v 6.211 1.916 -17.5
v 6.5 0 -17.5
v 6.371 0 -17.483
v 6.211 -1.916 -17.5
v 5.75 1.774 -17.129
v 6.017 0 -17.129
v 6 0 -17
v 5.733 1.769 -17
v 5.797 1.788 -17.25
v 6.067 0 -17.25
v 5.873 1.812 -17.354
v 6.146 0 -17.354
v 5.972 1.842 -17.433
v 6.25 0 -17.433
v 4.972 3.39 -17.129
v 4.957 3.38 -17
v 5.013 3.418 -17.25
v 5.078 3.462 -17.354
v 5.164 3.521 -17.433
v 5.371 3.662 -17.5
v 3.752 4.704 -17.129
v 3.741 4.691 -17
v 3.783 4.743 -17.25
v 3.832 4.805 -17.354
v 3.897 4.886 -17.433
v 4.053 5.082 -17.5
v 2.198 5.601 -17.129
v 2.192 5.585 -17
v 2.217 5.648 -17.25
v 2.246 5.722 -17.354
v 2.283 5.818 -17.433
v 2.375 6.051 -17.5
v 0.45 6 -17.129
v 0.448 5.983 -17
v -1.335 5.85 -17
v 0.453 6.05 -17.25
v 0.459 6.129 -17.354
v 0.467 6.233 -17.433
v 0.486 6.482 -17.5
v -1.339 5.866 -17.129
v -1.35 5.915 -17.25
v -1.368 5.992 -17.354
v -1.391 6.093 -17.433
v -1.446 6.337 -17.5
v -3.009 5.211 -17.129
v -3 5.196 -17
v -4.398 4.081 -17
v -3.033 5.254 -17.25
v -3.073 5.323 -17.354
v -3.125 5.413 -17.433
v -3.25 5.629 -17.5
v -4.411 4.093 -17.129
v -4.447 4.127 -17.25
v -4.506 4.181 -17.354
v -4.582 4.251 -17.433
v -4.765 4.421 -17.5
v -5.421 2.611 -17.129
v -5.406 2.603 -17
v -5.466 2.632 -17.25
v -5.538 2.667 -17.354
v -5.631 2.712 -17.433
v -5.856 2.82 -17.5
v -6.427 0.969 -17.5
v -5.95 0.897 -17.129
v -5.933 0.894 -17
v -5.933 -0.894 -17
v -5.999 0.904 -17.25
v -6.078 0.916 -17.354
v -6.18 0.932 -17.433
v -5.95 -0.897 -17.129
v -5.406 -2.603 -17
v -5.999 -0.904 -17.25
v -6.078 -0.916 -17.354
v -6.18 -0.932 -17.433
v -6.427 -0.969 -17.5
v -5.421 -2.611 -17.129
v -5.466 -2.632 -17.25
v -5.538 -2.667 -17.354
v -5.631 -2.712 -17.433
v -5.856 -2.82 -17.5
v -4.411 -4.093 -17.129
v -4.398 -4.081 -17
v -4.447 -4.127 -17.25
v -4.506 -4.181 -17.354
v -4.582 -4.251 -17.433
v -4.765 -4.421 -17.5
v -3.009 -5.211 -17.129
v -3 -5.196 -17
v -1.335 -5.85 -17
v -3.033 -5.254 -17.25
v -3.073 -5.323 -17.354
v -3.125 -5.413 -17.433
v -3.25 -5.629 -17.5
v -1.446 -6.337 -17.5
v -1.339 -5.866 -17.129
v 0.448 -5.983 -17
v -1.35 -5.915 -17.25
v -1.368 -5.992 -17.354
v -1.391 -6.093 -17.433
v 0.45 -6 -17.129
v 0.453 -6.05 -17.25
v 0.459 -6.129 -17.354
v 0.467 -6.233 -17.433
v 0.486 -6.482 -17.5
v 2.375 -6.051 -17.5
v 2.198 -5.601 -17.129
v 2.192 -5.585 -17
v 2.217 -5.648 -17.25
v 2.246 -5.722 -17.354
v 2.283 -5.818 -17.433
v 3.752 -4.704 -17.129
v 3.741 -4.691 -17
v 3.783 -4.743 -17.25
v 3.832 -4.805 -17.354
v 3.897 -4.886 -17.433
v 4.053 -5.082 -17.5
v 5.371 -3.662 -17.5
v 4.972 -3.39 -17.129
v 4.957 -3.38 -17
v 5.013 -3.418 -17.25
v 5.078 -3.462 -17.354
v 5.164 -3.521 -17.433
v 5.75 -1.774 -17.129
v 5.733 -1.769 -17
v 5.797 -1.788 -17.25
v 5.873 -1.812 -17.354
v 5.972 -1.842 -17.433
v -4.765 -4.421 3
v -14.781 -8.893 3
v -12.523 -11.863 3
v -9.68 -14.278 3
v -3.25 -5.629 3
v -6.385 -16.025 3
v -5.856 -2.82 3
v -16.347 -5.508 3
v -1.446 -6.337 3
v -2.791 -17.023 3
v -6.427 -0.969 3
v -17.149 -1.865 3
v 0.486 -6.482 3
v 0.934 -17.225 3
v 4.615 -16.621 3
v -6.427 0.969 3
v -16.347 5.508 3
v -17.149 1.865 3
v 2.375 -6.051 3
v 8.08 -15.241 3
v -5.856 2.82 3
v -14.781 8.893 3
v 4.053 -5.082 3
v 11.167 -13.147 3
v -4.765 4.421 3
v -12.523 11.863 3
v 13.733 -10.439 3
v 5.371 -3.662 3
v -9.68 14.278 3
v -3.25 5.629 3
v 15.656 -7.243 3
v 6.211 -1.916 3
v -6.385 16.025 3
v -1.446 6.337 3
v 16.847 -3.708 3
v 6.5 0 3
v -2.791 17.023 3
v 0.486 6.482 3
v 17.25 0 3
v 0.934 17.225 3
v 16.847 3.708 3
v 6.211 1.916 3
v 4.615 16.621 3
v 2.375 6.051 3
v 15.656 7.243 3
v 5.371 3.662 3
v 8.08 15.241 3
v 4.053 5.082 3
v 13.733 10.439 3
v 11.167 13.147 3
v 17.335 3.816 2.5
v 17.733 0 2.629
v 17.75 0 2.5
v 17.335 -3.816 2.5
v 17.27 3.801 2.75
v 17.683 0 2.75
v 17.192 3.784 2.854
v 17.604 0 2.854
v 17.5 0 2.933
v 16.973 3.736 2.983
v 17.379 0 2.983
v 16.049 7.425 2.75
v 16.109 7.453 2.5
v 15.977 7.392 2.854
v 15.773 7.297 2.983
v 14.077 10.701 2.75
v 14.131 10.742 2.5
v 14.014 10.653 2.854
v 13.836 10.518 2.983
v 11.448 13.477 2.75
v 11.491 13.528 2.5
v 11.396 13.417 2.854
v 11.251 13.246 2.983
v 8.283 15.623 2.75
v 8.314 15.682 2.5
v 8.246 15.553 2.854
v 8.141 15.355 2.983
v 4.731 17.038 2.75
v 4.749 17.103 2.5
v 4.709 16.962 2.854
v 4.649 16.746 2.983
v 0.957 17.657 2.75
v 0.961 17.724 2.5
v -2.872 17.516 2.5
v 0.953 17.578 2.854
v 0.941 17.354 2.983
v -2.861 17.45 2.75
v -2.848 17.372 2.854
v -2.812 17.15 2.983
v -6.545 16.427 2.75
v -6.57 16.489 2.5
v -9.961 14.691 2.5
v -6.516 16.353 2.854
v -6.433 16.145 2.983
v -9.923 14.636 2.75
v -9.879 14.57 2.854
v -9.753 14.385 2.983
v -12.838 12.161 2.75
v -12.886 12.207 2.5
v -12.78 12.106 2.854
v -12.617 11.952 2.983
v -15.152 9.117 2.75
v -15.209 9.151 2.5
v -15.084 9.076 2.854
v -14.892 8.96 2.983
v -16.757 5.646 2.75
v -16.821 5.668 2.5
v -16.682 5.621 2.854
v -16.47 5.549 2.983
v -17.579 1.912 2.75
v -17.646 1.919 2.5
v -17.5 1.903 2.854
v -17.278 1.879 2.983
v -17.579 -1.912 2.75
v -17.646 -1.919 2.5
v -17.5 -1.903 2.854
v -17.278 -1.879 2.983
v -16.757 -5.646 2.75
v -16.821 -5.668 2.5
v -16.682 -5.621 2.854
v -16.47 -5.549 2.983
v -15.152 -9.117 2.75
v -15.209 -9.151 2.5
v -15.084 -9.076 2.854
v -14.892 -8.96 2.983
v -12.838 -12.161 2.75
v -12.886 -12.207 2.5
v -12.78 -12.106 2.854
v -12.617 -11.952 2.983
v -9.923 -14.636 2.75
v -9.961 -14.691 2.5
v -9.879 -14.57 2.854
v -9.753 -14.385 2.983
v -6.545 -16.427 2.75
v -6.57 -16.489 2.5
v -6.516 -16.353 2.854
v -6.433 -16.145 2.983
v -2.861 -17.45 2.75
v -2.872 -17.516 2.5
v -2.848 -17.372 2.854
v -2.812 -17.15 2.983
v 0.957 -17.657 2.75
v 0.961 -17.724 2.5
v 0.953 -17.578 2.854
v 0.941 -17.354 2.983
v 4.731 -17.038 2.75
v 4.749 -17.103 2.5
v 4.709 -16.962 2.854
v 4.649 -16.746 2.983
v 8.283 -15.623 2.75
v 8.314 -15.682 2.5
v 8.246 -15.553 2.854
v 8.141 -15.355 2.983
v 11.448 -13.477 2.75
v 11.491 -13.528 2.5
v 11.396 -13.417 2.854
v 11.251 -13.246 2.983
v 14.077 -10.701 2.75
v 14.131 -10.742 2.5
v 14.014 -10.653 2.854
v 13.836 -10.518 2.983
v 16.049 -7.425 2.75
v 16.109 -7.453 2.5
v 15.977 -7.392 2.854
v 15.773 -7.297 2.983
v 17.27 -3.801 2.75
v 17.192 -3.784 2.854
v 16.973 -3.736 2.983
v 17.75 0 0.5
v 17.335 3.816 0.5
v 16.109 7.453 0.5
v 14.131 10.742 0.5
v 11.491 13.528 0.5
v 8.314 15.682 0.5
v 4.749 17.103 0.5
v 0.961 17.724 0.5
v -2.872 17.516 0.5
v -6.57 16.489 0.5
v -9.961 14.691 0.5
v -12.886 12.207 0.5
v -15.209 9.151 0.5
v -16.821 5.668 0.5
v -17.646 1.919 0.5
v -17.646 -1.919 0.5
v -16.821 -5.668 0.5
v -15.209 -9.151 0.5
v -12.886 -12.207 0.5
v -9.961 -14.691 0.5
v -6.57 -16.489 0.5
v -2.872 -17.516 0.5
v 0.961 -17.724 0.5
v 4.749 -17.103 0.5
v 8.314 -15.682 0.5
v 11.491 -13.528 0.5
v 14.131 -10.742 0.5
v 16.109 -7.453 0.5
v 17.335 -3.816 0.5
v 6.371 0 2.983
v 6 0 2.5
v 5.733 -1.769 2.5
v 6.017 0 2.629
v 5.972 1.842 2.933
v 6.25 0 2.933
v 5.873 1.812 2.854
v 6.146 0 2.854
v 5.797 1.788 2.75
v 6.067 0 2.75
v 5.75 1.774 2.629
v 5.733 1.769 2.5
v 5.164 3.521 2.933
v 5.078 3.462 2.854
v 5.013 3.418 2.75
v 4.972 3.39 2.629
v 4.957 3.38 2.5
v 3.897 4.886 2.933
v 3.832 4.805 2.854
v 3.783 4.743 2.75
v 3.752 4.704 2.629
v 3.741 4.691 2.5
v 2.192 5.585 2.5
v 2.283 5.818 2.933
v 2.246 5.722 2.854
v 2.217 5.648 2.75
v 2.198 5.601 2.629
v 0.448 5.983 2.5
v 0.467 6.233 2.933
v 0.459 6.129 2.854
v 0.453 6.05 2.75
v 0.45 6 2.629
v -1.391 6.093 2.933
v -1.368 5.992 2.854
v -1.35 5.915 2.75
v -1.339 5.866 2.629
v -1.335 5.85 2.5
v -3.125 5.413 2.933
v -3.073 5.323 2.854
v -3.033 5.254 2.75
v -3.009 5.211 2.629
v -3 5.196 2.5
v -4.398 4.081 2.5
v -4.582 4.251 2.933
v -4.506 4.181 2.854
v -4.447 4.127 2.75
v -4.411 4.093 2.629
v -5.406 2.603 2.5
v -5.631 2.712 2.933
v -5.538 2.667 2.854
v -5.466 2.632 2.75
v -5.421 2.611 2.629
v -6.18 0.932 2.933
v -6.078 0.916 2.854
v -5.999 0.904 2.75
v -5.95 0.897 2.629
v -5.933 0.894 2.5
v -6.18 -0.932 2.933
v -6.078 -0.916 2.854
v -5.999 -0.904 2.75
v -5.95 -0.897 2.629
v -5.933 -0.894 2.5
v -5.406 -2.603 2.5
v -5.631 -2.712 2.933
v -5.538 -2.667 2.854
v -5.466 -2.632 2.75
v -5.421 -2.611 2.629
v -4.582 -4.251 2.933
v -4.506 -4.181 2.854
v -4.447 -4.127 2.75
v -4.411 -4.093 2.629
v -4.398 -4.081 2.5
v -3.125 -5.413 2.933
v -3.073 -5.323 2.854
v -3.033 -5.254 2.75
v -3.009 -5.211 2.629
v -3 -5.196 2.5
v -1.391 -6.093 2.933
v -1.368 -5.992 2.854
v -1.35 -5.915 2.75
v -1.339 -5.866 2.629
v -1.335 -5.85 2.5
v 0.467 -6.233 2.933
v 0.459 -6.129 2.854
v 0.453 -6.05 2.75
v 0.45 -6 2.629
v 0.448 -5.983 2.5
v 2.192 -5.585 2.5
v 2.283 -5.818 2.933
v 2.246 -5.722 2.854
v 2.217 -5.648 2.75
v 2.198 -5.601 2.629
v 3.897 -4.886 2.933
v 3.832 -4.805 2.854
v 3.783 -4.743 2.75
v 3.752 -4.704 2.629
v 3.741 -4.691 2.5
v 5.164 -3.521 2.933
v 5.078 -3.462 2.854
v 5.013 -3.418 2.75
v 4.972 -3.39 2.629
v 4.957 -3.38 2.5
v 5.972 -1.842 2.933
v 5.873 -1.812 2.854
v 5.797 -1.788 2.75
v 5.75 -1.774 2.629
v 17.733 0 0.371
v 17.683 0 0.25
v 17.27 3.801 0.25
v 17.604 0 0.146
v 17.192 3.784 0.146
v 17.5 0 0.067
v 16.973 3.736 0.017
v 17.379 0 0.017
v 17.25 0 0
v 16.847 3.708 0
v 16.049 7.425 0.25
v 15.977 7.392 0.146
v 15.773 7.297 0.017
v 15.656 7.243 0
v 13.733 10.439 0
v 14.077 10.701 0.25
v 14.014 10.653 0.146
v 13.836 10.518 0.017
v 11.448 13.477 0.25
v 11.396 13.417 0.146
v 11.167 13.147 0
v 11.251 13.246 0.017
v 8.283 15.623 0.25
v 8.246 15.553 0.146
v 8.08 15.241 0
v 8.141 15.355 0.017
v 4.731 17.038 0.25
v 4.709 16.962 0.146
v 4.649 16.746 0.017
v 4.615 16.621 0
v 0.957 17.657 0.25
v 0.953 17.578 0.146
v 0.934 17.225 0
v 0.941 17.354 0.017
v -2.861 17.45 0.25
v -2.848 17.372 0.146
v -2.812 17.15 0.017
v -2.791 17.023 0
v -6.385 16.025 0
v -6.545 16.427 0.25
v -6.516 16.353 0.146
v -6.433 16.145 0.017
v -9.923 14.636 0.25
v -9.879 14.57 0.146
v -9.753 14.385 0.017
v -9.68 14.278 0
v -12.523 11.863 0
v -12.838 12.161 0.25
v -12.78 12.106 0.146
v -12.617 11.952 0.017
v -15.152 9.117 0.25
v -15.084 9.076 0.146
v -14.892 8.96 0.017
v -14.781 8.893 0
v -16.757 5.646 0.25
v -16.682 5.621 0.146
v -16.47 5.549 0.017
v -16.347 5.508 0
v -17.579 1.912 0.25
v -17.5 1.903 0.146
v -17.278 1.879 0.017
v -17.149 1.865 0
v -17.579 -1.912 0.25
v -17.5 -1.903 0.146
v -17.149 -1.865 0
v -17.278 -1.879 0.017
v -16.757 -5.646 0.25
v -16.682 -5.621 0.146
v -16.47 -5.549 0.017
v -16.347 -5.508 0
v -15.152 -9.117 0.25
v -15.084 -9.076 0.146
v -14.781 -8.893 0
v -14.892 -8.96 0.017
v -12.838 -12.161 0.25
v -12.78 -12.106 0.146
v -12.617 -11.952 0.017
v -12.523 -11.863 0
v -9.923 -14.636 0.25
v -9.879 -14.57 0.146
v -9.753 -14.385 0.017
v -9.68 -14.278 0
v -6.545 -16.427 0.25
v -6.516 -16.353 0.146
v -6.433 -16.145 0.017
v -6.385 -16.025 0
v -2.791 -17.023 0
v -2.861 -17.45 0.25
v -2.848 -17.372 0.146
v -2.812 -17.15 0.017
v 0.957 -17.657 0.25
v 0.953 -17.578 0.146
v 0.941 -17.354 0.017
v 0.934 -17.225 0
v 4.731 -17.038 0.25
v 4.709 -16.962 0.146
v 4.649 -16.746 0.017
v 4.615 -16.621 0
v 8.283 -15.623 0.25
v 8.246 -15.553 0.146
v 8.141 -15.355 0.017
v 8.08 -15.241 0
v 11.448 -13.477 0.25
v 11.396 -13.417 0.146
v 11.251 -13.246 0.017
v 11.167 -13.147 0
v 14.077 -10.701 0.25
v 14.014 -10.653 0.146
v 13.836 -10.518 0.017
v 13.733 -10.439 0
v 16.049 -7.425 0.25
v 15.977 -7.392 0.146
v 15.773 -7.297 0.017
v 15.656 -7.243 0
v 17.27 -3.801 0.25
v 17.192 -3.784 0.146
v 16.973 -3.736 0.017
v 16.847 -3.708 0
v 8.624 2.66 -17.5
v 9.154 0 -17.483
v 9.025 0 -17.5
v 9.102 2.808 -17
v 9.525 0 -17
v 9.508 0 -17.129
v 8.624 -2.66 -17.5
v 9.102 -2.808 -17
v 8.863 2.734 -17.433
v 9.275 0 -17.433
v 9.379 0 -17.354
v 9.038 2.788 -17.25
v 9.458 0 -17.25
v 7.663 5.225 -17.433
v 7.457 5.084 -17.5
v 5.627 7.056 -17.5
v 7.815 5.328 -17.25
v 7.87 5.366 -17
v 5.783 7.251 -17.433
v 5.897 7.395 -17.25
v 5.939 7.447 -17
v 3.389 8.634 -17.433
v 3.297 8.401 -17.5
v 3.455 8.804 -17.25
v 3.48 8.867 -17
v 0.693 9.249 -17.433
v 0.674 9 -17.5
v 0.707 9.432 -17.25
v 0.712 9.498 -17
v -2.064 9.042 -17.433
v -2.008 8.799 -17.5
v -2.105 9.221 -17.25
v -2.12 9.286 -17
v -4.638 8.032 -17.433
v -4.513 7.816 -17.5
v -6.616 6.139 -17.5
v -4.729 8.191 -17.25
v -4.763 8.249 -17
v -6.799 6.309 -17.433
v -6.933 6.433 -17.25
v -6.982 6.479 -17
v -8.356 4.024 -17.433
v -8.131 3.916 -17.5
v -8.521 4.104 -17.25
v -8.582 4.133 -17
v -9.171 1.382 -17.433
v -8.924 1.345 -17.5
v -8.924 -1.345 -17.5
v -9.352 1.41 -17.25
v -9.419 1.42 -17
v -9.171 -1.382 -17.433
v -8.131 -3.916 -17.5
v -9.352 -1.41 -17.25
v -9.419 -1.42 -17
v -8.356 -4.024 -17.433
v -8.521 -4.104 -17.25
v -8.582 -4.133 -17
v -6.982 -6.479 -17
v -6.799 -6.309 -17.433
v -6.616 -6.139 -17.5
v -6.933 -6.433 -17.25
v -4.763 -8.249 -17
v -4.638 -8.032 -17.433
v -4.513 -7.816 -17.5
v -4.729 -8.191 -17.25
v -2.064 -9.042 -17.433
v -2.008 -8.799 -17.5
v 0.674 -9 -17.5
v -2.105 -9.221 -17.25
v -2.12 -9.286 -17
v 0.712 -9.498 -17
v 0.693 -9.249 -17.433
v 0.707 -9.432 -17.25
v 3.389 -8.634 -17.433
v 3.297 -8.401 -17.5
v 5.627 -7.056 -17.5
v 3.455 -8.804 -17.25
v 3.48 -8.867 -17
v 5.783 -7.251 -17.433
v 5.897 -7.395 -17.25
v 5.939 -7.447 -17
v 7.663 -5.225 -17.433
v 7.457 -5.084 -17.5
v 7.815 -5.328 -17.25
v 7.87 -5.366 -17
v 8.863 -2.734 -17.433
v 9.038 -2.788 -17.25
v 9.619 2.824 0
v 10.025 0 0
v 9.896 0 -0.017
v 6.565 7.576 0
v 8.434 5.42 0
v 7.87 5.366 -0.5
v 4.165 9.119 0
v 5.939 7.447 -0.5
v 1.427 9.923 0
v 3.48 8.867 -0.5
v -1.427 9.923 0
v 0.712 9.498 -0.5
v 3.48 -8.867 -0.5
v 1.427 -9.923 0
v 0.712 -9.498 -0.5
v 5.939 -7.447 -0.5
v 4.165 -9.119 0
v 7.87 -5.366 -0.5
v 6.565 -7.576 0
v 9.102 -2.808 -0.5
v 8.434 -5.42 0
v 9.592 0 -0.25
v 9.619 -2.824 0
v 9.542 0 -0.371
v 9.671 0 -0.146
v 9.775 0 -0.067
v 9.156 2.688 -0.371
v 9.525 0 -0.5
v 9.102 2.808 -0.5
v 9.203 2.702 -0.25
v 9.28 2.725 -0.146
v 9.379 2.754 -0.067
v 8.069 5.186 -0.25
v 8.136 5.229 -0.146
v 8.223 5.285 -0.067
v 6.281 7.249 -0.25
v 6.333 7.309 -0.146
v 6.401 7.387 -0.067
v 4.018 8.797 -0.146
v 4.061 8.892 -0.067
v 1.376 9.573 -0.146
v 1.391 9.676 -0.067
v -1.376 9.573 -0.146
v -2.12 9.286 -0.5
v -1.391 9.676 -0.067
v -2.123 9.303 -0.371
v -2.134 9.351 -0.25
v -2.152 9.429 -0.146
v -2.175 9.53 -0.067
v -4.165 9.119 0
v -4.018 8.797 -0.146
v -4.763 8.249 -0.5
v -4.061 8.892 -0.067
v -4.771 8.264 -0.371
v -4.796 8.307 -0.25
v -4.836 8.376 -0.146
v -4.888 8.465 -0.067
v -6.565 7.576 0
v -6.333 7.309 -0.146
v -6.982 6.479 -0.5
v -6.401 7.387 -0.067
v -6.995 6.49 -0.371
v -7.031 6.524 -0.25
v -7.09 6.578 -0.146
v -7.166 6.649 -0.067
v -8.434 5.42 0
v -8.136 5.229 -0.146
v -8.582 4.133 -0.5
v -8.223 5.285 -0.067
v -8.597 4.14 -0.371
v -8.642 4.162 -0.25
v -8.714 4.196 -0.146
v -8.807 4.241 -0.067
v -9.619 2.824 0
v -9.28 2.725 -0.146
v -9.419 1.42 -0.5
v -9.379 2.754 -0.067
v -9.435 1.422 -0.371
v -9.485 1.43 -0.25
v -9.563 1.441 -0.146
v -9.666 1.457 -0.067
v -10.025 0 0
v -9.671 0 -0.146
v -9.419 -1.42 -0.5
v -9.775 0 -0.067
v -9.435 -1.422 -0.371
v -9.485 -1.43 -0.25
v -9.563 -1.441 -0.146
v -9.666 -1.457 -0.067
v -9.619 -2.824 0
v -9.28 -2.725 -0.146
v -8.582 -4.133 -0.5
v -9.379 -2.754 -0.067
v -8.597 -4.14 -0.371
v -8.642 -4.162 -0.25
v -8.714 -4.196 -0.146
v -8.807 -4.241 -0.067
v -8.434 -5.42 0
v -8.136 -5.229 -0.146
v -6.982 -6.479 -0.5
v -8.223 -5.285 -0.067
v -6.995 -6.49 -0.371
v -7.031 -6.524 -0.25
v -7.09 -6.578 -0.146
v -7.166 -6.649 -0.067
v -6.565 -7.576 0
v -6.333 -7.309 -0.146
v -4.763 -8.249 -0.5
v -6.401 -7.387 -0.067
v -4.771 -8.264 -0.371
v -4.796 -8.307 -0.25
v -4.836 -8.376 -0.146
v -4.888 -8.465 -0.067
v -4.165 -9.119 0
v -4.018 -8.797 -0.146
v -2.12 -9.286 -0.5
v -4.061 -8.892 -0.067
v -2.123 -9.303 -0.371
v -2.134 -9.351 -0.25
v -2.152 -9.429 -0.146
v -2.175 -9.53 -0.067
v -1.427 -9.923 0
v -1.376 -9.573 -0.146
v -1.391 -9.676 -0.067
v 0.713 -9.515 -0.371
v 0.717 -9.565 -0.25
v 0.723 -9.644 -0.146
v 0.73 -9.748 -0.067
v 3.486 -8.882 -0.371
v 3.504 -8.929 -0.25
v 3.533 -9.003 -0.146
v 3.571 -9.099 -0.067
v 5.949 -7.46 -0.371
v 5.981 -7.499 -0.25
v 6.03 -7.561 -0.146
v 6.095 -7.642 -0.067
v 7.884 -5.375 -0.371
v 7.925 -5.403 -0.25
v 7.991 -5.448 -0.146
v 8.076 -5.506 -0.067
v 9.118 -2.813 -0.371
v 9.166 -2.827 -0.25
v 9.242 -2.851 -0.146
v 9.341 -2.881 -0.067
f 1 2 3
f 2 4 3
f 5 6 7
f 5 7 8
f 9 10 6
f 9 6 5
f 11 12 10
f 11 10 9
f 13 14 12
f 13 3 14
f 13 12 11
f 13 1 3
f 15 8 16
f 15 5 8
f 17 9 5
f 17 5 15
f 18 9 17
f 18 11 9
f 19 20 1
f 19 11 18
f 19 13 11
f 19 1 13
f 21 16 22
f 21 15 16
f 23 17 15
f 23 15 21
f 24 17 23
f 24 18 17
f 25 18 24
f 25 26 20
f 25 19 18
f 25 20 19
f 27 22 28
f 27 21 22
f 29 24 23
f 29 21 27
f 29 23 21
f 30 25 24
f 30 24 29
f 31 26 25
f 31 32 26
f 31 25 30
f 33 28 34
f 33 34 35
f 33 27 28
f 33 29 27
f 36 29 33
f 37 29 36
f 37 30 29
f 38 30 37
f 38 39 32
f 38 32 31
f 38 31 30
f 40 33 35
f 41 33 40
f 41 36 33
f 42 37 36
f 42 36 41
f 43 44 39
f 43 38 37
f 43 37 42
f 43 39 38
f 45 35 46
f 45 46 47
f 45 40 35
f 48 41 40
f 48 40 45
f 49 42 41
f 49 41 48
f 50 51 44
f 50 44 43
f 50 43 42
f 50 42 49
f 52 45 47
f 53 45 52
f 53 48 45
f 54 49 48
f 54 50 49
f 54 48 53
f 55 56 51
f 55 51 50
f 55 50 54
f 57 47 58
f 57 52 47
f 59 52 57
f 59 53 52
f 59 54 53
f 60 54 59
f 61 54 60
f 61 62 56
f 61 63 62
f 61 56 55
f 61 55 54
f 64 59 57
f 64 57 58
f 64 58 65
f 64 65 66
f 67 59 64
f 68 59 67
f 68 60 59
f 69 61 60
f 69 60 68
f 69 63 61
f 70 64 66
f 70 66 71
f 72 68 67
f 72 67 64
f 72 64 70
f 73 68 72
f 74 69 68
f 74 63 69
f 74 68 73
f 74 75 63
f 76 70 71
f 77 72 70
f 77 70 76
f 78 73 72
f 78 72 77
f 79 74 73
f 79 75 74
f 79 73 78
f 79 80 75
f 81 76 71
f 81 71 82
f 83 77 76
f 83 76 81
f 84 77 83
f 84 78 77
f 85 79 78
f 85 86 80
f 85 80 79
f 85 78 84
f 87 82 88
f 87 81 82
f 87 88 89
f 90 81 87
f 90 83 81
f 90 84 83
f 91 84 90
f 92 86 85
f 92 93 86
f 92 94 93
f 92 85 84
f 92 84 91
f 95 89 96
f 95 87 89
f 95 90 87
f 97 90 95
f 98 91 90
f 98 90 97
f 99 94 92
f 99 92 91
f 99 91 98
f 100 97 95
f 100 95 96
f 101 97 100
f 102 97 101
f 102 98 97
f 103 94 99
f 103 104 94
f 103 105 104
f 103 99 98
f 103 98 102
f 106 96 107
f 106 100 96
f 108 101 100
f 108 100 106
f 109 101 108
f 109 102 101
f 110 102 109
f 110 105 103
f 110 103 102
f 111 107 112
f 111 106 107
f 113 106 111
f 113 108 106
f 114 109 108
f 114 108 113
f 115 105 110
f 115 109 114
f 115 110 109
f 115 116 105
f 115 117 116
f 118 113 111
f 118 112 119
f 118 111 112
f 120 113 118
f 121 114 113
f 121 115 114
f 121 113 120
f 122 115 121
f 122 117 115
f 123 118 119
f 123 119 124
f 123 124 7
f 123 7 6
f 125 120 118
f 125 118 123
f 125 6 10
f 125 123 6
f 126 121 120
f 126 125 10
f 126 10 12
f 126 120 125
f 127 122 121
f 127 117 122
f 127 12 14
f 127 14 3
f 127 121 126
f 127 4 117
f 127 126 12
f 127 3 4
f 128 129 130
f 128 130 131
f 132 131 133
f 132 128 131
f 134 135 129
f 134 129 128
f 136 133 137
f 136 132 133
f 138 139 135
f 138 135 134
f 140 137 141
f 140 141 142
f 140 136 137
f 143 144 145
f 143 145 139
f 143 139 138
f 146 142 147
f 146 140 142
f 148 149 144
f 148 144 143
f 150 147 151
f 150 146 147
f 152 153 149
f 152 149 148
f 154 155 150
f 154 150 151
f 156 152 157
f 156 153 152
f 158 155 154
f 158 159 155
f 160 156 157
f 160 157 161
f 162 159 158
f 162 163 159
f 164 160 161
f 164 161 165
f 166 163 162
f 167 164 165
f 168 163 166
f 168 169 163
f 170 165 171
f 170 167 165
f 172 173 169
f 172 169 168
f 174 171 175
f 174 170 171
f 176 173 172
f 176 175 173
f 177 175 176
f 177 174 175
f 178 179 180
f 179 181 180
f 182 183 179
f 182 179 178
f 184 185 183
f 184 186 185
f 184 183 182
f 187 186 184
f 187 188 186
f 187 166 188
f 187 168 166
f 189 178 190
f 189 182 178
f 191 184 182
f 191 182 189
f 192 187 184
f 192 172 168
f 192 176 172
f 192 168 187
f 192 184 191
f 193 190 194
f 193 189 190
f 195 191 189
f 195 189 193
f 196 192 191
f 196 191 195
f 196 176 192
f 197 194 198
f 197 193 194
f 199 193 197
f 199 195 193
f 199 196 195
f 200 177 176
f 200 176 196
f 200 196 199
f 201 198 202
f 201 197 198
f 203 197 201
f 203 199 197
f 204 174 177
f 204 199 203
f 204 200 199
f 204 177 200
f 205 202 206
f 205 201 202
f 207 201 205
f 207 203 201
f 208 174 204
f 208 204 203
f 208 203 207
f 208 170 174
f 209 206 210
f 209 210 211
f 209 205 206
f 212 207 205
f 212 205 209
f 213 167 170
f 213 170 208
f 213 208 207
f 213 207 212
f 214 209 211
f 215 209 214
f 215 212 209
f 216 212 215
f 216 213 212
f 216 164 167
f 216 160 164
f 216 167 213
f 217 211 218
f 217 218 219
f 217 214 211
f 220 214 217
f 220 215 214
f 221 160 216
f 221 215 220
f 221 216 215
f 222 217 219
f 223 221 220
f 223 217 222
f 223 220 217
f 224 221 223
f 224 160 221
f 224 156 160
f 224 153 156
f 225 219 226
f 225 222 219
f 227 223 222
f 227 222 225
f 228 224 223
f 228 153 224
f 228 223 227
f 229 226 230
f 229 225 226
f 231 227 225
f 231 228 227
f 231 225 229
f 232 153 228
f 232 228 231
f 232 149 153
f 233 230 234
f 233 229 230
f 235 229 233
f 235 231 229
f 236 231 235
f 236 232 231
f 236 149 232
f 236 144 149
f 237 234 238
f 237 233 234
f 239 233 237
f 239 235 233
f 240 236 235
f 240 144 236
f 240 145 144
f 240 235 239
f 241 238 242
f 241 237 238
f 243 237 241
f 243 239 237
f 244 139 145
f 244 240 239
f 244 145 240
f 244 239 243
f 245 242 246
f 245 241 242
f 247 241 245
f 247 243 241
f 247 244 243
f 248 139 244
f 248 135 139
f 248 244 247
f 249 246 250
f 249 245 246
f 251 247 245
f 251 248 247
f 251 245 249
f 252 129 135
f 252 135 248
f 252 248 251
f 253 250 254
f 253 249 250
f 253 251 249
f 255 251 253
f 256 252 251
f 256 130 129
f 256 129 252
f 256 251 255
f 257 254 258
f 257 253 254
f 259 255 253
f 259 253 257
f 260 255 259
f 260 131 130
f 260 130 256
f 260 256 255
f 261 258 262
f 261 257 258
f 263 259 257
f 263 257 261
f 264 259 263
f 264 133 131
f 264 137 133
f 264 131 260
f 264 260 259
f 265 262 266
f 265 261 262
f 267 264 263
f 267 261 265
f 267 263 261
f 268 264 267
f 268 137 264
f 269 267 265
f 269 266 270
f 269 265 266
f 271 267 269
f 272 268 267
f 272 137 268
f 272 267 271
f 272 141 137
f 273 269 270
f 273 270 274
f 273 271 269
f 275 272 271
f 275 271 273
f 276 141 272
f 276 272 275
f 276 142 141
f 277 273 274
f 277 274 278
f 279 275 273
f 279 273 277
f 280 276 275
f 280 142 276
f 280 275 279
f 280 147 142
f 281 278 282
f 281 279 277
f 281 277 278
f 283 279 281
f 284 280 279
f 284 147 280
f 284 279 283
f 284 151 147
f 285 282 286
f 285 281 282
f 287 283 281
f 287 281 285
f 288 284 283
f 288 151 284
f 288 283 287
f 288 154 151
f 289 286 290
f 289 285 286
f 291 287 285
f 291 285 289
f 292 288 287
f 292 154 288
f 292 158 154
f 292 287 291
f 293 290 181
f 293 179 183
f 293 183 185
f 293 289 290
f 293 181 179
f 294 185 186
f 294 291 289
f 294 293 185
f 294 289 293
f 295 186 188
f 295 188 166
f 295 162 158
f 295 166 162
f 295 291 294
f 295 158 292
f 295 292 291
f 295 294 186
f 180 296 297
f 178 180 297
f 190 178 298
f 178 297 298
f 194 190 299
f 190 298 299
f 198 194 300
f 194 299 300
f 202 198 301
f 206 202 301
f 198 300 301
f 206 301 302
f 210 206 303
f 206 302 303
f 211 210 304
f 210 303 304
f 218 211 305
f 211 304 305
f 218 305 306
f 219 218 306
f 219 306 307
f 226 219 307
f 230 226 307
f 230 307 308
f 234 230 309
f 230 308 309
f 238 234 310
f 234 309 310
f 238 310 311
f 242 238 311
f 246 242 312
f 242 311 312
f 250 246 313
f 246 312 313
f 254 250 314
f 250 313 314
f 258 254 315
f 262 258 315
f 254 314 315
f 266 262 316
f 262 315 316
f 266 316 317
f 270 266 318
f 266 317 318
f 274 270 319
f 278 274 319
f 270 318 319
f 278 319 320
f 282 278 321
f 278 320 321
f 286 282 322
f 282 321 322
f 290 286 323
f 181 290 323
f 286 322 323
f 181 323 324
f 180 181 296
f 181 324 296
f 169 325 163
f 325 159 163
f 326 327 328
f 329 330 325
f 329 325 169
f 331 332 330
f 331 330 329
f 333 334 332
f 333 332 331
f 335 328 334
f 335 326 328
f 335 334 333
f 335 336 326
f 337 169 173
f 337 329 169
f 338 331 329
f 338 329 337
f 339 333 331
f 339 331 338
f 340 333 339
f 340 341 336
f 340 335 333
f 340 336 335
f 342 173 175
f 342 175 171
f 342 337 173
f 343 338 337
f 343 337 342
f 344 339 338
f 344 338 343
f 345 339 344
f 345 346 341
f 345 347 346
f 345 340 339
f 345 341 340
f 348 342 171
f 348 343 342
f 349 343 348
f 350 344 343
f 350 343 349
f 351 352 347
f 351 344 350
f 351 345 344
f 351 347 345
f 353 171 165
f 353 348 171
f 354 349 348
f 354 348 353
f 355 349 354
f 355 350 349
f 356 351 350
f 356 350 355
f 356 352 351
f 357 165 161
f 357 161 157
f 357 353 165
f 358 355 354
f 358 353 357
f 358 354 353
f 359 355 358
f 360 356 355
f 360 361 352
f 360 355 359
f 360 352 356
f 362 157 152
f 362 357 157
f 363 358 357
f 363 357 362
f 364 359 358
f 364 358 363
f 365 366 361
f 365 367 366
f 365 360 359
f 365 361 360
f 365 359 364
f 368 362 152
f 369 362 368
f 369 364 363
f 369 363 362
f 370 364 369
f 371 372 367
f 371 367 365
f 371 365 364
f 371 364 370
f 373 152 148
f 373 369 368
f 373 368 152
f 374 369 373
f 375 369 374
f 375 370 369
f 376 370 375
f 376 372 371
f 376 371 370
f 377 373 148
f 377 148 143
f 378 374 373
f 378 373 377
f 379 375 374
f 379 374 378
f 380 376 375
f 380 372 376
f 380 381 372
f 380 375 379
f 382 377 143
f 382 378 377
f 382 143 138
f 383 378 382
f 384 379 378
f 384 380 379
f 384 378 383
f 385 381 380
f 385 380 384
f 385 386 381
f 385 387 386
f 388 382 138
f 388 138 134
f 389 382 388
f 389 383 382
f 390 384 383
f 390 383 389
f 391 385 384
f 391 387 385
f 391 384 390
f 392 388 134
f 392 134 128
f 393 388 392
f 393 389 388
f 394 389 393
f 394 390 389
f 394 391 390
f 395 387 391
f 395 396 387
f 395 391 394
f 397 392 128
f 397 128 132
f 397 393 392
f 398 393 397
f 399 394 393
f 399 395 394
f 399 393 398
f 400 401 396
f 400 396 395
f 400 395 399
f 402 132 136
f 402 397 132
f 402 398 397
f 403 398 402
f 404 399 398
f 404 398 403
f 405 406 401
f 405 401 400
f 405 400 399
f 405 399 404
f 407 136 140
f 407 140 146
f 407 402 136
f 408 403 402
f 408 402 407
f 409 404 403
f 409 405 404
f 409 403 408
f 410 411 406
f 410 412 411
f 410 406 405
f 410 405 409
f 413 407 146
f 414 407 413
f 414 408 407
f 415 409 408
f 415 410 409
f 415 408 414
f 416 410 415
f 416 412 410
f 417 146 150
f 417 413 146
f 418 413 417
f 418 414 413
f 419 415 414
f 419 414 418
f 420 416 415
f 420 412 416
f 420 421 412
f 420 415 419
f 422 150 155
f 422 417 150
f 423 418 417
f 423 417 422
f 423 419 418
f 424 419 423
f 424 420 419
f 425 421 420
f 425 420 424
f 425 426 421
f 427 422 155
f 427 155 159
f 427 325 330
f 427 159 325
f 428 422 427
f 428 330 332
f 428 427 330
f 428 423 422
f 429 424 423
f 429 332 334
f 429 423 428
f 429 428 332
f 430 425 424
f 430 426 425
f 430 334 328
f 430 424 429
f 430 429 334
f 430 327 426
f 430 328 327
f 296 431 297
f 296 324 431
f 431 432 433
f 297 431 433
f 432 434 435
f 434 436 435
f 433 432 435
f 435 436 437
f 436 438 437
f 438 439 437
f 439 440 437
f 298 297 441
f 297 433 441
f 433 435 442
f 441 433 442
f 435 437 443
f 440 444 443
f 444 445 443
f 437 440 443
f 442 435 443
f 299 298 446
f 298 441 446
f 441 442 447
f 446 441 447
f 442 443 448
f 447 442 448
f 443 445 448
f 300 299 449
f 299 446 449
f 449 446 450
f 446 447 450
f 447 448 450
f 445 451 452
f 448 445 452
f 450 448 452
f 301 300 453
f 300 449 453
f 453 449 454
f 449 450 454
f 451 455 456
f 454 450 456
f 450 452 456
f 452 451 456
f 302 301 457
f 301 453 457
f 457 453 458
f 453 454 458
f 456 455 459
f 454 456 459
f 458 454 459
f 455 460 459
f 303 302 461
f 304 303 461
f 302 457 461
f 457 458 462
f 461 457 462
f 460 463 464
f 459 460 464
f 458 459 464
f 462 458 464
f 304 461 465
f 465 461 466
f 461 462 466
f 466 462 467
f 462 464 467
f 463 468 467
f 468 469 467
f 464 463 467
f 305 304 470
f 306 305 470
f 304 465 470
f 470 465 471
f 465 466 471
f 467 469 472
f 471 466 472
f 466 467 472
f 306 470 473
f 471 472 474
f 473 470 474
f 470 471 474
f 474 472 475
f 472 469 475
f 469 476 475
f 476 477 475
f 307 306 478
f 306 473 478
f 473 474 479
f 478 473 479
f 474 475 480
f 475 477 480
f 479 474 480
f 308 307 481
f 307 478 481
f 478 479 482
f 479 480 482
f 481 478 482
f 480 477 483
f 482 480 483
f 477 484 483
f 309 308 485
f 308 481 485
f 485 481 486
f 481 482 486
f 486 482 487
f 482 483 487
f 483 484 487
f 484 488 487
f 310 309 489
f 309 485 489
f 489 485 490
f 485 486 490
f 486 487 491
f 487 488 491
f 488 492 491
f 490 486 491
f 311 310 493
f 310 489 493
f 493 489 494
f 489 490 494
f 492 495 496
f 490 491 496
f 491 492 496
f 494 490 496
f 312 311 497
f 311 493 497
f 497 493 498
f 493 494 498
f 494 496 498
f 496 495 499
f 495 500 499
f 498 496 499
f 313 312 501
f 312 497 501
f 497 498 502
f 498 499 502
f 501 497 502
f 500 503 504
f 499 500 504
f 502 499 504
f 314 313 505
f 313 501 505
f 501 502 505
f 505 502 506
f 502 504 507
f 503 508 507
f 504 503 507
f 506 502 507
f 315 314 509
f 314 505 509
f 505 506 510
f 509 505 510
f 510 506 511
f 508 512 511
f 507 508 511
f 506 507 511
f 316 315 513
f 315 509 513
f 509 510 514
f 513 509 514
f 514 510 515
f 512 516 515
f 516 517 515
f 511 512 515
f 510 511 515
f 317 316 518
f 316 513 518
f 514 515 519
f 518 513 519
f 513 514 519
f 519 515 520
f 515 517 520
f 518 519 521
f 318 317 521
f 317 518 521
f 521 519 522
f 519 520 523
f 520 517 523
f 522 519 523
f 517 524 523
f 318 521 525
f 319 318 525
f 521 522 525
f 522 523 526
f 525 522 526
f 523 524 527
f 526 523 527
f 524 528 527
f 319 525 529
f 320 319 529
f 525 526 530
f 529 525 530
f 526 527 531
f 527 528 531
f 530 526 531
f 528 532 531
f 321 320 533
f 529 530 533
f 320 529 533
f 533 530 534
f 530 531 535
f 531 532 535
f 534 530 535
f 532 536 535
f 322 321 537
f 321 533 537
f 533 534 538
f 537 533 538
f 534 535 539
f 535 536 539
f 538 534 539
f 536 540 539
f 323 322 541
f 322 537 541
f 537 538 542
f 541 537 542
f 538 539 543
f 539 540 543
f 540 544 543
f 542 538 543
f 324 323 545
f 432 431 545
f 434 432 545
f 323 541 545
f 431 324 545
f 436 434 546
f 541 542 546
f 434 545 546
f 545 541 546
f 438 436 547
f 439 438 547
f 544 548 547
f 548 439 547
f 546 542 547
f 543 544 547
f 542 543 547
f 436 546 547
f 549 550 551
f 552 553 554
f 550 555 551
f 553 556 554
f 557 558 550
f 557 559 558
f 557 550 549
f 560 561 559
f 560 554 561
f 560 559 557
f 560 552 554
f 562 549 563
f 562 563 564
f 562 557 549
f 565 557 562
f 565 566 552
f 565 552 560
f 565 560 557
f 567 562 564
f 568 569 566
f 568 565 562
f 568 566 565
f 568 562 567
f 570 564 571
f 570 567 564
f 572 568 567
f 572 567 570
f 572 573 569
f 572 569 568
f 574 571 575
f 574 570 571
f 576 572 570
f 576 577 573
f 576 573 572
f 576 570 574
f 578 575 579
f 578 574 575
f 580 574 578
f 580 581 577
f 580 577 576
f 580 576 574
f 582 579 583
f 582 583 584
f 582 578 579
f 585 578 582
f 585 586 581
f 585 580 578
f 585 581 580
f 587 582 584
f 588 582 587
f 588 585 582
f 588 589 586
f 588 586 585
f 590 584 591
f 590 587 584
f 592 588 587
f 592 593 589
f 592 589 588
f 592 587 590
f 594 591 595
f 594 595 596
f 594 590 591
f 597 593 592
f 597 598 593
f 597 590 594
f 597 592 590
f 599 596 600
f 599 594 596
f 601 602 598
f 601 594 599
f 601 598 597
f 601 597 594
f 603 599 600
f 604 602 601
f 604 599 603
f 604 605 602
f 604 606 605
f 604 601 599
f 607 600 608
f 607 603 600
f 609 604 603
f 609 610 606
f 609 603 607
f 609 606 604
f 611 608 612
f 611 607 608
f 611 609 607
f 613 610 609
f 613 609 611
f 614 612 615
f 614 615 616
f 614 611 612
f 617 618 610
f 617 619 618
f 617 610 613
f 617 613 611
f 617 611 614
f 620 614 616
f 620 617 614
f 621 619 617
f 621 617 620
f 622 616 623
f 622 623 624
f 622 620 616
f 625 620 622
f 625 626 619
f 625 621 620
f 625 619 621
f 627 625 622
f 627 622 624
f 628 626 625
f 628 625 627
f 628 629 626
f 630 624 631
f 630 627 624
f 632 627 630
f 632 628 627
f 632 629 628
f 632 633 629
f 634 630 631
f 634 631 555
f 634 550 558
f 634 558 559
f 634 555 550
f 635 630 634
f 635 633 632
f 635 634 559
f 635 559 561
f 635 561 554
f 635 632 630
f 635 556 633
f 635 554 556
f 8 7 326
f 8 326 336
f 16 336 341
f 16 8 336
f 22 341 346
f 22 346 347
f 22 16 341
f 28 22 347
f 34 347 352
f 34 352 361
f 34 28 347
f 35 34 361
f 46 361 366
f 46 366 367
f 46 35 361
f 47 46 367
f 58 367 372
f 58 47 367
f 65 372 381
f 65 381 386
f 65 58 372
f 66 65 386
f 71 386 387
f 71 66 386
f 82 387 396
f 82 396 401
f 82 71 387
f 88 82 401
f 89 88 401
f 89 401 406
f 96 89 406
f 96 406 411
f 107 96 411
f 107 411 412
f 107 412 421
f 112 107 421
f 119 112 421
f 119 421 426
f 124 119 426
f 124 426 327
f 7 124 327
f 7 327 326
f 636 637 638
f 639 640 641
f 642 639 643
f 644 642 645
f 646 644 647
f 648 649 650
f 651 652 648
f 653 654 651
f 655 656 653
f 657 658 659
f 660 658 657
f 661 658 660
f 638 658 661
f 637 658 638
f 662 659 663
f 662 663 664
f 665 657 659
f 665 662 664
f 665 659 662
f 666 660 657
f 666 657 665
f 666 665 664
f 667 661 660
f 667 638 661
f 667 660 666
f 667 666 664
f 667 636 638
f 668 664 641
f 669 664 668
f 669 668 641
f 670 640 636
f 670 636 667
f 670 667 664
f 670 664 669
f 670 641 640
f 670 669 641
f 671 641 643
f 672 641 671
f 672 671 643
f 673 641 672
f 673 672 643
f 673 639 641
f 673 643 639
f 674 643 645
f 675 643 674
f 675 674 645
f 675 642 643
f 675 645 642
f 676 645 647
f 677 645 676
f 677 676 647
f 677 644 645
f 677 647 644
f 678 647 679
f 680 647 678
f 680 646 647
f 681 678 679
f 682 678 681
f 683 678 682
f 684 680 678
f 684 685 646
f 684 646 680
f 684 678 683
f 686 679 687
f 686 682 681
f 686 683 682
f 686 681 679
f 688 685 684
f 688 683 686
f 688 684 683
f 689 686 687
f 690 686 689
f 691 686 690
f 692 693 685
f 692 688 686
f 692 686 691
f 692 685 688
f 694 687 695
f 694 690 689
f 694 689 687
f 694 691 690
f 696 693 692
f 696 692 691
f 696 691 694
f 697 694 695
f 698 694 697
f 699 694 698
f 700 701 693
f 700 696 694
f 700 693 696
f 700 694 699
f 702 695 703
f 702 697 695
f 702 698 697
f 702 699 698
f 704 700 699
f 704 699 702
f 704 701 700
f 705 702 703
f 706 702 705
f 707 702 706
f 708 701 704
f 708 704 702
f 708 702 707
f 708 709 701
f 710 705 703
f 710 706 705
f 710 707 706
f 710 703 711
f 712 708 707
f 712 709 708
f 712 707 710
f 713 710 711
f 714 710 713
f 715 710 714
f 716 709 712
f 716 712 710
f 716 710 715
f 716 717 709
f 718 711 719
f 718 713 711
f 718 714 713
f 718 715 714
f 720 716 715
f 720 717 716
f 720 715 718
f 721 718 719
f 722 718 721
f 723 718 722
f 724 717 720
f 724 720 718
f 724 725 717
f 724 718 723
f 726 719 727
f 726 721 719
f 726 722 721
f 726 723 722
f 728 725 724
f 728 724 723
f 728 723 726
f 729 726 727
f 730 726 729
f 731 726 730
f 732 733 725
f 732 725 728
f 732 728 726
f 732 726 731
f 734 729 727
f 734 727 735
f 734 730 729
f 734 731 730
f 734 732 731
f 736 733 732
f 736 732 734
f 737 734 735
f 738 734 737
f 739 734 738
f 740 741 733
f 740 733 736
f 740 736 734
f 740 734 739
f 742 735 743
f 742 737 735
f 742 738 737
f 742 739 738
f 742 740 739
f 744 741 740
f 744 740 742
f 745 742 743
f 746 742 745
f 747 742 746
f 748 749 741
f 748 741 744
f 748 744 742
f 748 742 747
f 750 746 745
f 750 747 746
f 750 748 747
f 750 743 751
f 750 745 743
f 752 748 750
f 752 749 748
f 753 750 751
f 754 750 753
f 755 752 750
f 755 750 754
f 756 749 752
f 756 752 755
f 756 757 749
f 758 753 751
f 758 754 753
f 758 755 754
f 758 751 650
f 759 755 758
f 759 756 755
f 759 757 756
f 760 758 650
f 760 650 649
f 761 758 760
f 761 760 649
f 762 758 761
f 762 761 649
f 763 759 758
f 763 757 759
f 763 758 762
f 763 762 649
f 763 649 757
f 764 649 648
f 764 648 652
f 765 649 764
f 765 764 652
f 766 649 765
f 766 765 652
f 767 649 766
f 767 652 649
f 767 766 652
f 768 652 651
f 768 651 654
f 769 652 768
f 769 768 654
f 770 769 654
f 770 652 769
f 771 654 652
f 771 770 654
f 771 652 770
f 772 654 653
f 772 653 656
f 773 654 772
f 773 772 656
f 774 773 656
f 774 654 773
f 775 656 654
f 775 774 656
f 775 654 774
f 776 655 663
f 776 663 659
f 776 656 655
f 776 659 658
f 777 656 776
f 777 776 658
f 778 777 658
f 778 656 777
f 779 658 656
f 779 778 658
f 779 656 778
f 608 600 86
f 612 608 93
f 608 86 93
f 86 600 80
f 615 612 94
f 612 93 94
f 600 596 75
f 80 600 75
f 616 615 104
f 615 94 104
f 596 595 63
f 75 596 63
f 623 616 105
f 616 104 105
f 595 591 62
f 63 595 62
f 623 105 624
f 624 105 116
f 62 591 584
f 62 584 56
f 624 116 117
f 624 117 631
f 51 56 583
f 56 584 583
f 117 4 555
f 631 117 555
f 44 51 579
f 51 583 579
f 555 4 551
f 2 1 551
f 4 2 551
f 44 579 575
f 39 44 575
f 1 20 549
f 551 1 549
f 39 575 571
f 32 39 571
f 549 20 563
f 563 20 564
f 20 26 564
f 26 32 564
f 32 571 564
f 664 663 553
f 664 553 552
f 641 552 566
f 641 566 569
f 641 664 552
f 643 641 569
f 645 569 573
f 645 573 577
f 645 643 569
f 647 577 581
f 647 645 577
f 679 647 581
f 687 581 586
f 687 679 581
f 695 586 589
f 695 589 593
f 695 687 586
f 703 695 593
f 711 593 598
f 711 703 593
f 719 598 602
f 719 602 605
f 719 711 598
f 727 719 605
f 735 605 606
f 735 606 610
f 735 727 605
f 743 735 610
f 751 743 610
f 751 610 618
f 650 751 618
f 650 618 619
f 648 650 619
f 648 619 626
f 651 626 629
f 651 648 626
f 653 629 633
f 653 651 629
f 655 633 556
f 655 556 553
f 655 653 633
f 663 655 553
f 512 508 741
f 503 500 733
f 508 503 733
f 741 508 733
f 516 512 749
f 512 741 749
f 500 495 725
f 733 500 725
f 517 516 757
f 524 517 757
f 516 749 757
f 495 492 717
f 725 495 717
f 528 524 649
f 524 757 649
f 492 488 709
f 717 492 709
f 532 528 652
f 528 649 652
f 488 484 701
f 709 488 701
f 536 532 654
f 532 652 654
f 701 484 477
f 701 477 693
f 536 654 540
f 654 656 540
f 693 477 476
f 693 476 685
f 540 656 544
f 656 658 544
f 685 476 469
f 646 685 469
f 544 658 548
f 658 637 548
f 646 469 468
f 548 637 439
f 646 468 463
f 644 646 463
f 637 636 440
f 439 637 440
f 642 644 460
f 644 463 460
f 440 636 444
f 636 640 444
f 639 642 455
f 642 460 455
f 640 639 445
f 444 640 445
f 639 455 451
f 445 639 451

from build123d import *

# Parameters (mm, degrees)
F0_R     = 9.525
F0_R_2   = 6
F1_DEPTH = 17.5
F2_R     = 17.75
F2_R_2   = 6
F3_DEPTH = 3
F4_R     = 0.5


with BuildPart() as f1:
    # F0 (on Top) → F1 (new body)
    with BuildSketch(Plane.XY):
        Circle(F0_R)
        Circle(F0_R_2, mode=Mode.SUBTRACT)
    extrude(amount=-F1_DEPTH)

    # F2 (on Top) → F3 (join)
    with BuildSketch(Plane.XY):
        Circle(F2_R)
        Circle(F2_R_2, mode=Mode.SUBTRACT)
    extrude(amount=F3_DEPTH)

    # F4
    f4_edges = [f1.edges().sort_by_distance(p)[0] for p in [
        (-9.525, 0, -17.5),
        (-6, 0, -17.5),
        (-17.75, 0, 0),
        (-9.525, 0, 0),
        (-17.75, 0, 3),
        (-6, 0, 3),
    ]]
    fillet(f4_edges, radius=F4_R)


solid = f1.part
